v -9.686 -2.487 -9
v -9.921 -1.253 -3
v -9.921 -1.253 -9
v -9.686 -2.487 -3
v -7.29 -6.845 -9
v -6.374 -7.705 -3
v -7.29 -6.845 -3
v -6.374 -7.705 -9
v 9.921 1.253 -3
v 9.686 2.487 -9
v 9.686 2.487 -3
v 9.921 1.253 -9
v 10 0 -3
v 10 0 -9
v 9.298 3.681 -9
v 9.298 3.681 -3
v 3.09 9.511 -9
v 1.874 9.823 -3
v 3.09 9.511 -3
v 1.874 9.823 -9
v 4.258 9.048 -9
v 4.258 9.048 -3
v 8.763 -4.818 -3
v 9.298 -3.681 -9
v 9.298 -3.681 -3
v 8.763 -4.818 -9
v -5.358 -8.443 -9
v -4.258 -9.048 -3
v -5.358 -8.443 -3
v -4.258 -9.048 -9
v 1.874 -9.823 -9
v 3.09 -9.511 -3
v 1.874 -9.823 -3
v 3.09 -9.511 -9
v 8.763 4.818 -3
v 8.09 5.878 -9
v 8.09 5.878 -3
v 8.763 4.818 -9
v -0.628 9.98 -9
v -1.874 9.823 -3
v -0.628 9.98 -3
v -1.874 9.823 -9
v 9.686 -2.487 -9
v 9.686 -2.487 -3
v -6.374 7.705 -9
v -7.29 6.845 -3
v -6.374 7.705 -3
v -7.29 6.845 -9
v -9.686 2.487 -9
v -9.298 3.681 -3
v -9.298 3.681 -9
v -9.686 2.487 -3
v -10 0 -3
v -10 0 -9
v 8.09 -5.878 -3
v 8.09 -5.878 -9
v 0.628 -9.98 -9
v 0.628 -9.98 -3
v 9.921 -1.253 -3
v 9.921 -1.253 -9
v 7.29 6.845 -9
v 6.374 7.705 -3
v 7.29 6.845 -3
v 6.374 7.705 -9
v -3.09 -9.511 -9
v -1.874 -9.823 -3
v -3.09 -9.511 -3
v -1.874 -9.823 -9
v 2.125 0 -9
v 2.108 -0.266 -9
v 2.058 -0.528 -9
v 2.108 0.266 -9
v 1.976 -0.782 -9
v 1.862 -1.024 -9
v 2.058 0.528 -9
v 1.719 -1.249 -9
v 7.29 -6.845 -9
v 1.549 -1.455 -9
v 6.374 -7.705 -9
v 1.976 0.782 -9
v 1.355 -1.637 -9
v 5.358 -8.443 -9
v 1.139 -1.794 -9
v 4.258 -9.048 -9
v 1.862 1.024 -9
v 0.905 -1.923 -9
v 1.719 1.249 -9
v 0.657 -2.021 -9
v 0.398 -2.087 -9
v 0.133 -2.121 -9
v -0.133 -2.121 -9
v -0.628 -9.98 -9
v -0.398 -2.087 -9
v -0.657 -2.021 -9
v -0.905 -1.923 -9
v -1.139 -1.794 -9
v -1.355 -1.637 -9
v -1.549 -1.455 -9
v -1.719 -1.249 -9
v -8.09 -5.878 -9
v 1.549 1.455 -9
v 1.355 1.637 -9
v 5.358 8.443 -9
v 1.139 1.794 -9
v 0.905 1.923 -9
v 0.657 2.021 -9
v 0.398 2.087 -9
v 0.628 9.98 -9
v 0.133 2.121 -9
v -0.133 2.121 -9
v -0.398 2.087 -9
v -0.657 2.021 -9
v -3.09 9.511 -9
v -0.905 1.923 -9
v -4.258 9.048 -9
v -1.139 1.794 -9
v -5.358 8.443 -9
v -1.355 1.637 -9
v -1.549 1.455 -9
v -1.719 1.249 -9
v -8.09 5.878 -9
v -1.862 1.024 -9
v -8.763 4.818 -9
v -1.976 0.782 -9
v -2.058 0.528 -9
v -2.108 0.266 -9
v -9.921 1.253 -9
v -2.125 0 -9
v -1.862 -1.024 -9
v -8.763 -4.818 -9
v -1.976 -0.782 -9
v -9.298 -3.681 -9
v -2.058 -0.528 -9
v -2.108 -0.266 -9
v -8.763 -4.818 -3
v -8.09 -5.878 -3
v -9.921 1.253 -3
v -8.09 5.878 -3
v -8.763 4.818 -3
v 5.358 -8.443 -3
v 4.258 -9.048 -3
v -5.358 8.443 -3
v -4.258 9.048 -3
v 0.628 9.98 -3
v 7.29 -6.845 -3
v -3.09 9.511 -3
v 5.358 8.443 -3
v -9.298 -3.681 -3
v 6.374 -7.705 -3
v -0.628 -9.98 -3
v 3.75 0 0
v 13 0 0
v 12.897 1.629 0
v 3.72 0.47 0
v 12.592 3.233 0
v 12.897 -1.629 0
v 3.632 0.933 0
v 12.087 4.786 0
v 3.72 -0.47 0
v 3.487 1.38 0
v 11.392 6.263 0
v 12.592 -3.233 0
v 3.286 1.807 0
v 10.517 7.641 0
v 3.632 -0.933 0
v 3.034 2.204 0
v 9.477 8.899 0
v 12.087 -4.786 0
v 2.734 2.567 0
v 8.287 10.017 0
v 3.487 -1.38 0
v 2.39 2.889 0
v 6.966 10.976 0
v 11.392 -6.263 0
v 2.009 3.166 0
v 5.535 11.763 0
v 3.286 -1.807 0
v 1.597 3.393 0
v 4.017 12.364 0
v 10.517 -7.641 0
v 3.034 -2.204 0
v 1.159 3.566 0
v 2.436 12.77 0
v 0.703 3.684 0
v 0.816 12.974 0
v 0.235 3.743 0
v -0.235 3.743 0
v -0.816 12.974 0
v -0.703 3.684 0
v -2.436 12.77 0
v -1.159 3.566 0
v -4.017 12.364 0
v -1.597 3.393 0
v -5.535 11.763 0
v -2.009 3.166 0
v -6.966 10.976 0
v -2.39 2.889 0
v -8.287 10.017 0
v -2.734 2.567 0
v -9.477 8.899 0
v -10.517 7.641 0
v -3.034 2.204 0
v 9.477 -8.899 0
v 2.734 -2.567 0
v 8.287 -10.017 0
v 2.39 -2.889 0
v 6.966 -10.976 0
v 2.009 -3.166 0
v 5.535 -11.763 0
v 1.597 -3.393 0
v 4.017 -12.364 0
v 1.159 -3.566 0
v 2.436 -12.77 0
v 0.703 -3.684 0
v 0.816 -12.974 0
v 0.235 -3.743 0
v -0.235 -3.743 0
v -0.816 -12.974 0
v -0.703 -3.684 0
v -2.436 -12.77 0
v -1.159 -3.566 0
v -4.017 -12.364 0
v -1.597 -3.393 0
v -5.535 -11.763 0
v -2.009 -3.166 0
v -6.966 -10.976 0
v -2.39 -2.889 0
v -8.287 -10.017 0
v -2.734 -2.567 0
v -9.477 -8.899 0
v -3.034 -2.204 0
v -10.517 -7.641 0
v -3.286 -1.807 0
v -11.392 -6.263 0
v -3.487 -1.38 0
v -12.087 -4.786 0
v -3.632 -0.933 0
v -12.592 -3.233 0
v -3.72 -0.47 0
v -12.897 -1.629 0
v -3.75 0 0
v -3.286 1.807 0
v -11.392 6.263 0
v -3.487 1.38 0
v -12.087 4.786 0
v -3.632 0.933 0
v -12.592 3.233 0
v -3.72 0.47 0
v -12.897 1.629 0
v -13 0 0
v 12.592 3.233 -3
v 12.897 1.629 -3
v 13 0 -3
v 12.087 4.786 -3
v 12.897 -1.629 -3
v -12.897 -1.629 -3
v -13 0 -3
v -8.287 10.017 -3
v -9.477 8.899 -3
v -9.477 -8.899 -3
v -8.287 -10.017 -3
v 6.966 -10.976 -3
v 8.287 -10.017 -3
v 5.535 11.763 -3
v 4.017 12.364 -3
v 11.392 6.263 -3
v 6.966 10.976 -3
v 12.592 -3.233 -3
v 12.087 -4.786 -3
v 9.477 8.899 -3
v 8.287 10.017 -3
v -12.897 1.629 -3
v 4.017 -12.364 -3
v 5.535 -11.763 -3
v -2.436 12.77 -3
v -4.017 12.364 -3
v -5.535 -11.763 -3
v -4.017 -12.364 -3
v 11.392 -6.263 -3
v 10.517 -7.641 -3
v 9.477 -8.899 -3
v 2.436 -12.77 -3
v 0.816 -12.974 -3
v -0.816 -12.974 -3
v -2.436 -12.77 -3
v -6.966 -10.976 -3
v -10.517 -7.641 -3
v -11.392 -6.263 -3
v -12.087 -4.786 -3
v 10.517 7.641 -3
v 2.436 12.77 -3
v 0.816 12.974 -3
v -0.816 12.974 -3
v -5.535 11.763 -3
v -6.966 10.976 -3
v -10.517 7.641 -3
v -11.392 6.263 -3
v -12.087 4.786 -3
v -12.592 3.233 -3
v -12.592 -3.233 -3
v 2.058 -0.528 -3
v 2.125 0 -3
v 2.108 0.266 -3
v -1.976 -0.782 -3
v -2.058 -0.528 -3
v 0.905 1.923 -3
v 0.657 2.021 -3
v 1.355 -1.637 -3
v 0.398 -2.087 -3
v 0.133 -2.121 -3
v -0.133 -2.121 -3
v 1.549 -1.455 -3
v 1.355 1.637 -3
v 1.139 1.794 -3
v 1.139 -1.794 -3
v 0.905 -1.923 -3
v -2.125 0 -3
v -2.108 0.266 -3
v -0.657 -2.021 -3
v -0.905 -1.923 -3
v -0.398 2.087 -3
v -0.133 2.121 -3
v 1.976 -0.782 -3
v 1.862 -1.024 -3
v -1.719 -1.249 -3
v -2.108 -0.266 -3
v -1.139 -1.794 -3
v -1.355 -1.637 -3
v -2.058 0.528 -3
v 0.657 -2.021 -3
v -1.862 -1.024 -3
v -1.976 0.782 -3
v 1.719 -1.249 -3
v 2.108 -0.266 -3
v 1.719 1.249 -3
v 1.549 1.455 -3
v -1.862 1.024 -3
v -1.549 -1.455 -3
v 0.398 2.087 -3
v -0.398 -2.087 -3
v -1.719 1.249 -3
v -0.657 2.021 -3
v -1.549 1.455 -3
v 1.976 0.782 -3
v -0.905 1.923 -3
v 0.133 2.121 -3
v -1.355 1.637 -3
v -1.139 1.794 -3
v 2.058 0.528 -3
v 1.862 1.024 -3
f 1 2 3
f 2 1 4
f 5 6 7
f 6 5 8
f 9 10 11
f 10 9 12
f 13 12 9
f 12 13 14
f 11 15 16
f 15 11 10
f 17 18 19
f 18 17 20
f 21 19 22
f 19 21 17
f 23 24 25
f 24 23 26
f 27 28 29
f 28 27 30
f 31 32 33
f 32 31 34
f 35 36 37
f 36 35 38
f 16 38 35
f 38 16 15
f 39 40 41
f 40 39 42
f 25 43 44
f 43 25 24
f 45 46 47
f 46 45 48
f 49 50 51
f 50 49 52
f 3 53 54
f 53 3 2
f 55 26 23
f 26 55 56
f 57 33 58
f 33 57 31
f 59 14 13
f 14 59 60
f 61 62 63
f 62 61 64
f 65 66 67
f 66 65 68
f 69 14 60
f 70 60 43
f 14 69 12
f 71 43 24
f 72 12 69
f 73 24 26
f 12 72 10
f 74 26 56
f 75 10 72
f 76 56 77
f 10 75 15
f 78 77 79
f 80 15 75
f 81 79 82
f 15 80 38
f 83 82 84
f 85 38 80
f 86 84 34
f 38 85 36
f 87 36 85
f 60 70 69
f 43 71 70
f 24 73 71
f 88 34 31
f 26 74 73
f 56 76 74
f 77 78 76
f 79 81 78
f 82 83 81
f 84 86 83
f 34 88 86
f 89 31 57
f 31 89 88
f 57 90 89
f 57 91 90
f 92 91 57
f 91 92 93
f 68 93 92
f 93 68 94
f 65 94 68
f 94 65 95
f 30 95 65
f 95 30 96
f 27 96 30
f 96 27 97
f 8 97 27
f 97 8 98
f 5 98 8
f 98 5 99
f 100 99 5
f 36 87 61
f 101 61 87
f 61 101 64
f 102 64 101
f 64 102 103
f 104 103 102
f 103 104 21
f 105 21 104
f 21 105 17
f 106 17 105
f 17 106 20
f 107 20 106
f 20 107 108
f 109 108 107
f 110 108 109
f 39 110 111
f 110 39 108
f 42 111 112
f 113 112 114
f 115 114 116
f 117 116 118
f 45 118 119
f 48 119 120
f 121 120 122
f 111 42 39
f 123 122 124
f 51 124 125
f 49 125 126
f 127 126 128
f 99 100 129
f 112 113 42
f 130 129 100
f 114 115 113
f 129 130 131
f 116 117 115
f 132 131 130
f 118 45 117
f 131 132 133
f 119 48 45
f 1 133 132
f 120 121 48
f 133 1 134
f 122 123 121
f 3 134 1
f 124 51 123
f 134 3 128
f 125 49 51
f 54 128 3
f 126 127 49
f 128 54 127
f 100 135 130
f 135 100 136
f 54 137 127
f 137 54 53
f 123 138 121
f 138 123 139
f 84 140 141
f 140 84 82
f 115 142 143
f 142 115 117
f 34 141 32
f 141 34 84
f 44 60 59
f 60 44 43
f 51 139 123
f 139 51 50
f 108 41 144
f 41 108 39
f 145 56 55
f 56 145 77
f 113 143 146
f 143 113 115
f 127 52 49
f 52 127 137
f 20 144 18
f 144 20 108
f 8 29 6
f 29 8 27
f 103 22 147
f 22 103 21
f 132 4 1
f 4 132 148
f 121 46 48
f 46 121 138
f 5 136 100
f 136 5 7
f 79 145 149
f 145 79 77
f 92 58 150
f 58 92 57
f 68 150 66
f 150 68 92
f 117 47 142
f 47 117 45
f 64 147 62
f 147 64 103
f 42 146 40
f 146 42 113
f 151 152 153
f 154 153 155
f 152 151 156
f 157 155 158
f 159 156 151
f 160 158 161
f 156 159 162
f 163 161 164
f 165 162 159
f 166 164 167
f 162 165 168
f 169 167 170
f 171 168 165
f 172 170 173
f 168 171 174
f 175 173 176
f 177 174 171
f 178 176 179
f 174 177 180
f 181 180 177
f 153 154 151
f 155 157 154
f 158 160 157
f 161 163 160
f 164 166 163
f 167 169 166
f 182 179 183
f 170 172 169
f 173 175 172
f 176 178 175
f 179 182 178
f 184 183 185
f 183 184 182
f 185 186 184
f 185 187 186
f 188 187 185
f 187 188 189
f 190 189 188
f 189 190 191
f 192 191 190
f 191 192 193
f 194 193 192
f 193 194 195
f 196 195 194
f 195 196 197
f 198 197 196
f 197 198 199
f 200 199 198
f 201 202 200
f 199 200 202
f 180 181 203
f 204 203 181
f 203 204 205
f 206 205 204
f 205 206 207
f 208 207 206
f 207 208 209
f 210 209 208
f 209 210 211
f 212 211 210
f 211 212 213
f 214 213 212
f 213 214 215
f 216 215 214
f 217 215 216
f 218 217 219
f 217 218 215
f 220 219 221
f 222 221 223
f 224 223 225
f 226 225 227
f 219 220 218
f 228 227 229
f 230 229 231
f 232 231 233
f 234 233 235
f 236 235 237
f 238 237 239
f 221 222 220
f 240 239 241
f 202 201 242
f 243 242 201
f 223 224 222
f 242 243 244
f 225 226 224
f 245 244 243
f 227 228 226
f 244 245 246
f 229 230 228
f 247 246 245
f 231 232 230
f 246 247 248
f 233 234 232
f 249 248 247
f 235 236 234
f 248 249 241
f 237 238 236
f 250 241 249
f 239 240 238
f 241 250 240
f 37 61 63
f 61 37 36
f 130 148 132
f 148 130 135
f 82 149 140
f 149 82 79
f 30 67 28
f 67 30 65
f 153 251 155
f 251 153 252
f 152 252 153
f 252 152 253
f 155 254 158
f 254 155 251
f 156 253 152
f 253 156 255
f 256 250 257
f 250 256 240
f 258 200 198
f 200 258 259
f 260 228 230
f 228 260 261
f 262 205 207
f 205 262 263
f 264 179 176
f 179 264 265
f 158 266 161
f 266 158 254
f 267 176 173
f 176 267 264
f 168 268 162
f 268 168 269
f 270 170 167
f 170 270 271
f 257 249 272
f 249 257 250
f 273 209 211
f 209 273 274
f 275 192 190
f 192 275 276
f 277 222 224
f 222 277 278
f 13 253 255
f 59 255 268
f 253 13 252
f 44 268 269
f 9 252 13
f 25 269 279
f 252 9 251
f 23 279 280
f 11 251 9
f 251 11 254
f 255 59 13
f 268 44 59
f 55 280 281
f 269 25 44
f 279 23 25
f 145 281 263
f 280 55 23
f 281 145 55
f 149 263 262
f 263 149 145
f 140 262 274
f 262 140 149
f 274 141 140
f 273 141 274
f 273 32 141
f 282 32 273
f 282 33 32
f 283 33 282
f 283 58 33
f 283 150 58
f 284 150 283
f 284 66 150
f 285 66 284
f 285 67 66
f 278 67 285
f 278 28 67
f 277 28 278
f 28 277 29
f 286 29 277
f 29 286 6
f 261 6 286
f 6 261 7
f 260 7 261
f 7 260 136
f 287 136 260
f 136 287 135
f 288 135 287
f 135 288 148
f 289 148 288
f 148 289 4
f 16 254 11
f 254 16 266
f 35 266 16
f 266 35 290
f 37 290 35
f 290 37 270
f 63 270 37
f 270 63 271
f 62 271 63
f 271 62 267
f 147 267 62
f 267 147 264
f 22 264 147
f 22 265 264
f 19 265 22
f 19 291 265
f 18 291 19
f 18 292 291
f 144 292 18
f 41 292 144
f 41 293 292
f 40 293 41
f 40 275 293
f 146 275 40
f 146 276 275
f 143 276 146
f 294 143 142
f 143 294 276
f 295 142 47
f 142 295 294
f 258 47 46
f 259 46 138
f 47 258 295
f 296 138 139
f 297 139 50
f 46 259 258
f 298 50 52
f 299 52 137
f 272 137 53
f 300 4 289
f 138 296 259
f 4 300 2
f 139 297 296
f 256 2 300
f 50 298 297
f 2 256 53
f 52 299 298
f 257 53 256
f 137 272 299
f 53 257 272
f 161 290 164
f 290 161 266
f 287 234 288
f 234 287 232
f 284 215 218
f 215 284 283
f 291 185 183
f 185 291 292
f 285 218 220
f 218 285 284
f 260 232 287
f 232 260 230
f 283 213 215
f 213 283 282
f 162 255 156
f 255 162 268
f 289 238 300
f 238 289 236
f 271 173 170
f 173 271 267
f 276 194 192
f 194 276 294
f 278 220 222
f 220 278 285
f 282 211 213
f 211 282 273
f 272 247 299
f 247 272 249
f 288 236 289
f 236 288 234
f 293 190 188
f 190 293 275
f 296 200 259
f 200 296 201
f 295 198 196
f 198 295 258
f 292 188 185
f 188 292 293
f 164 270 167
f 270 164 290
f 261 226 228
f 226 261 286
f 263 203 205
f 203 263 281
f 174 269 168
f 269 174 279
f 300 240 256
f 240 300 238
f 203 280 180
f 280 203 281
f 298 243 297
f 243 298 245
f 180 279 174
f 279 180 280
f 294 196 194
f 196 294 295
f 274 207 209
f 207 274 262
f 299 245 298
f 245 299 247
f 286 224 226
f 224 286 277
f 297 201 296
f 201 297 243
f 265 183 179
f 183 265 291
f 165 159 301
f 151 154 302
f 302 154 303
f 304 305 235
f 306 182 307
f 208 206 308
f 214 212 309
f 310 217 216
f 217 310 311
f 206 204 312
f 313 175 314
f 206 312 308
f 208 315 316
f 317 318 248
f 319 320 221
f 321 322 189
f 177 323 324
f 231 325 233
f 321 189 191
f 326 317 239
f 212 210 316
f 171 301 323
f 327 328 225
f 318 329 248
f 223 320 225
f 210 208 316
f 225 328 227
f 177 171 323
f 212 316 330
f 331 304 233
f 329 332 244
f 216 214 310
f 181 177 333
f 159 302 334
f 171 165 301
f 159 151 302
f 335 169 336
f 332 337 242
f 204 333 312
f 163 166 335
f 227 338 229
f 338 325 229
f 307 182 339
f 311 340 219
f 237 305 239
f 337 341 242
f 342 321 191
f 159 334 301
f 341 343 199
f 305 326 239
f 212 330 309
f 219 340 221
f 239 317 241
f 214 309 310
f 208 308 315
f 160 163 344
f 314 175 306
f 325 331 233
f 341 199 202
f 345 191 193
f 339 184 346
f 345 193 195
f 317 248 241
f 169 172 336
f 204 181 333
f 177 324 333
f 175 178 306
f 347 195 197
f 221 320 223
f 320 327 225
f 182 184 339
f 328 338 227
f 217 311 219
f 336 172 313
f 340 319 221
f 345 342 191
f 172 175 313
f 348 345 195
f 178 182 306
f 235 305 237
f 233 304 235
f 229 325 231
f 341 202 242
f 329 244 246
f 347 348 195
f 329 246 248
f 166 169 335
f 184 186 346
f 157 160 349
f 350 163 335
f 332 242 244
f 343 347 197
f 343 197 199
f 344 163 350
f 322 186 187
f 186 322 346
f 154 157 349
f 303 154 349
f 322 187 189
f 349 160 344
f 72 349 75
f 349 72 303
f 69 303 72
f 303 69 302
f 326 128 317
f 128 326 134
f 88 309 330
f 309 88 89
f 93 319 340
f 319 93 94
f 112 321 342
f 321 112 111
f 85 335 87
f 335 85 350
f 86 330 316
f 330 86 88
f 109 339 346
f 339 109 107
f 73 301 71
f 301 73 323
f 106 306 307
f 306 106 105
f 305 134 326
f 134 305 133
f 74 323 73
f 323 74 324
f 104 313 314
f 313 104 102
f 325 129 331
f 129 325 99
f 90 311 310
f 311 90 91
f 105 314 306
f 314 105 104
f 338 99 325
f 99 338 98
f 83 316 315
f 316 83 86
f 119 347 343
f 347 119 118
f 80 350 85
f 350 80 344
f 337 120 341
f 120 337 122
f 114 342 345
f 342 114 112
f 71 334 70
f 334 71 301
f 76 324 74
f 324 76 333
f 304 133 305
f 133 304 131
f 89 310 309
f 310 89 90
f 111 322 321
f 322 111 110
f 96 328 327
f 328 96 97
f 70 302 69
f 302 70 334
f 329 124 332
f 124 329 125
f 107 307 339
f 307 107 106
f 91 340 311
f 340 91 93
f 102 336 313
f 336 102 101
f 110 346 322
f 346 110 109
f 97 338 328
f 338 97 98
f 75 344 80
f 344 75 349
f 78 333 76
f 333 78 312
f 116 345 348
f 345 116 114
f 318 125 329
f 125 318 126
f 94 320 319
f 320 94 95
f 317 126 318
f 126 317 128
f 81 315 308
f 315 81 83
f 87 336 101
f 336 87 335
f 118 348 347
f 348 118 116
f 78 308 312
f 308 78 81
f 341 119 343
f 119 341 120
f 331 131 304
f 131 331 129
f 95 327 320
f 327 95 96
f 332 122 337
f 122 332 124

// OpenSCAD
$fn = 50;


difference() {
	union() {
		translate(v = [0, 0, -9.0000000000]) {
			cylinder(h = 9, r = 10.0000000000);
		}
		translate(v = [0, 0, -3.0000000000]) {
			cylinder(h = 3, r = 13.0000000000);
		}
	}
	union() {
		translate(v = [0, 0, 0]) {
			rotate(a = [0, 0, 0]) {
				difference() {
					union() {
						#translate(v = [0, 0, -9.0000000000]) {
							cylinder(h = 9, r = 2.0000000000);
						}
						#translate(v = [0, 0, -3]) {
							cylinder(h = 3, r = 10.0000000000, r1 = 2.1250000000, r2 = 3.7500000000);
						}
						#translate(v = [0, 0, -9.0000000000]) {
							cylinder(h = 9, r = 2.1250000000);
						}
						#translate(v = [0, 0, -9.0000000000]) {
							cylinder(h = 9, r = 2.0000000000);
						}
					}
					union();
				}
			}
		}
	}
}
